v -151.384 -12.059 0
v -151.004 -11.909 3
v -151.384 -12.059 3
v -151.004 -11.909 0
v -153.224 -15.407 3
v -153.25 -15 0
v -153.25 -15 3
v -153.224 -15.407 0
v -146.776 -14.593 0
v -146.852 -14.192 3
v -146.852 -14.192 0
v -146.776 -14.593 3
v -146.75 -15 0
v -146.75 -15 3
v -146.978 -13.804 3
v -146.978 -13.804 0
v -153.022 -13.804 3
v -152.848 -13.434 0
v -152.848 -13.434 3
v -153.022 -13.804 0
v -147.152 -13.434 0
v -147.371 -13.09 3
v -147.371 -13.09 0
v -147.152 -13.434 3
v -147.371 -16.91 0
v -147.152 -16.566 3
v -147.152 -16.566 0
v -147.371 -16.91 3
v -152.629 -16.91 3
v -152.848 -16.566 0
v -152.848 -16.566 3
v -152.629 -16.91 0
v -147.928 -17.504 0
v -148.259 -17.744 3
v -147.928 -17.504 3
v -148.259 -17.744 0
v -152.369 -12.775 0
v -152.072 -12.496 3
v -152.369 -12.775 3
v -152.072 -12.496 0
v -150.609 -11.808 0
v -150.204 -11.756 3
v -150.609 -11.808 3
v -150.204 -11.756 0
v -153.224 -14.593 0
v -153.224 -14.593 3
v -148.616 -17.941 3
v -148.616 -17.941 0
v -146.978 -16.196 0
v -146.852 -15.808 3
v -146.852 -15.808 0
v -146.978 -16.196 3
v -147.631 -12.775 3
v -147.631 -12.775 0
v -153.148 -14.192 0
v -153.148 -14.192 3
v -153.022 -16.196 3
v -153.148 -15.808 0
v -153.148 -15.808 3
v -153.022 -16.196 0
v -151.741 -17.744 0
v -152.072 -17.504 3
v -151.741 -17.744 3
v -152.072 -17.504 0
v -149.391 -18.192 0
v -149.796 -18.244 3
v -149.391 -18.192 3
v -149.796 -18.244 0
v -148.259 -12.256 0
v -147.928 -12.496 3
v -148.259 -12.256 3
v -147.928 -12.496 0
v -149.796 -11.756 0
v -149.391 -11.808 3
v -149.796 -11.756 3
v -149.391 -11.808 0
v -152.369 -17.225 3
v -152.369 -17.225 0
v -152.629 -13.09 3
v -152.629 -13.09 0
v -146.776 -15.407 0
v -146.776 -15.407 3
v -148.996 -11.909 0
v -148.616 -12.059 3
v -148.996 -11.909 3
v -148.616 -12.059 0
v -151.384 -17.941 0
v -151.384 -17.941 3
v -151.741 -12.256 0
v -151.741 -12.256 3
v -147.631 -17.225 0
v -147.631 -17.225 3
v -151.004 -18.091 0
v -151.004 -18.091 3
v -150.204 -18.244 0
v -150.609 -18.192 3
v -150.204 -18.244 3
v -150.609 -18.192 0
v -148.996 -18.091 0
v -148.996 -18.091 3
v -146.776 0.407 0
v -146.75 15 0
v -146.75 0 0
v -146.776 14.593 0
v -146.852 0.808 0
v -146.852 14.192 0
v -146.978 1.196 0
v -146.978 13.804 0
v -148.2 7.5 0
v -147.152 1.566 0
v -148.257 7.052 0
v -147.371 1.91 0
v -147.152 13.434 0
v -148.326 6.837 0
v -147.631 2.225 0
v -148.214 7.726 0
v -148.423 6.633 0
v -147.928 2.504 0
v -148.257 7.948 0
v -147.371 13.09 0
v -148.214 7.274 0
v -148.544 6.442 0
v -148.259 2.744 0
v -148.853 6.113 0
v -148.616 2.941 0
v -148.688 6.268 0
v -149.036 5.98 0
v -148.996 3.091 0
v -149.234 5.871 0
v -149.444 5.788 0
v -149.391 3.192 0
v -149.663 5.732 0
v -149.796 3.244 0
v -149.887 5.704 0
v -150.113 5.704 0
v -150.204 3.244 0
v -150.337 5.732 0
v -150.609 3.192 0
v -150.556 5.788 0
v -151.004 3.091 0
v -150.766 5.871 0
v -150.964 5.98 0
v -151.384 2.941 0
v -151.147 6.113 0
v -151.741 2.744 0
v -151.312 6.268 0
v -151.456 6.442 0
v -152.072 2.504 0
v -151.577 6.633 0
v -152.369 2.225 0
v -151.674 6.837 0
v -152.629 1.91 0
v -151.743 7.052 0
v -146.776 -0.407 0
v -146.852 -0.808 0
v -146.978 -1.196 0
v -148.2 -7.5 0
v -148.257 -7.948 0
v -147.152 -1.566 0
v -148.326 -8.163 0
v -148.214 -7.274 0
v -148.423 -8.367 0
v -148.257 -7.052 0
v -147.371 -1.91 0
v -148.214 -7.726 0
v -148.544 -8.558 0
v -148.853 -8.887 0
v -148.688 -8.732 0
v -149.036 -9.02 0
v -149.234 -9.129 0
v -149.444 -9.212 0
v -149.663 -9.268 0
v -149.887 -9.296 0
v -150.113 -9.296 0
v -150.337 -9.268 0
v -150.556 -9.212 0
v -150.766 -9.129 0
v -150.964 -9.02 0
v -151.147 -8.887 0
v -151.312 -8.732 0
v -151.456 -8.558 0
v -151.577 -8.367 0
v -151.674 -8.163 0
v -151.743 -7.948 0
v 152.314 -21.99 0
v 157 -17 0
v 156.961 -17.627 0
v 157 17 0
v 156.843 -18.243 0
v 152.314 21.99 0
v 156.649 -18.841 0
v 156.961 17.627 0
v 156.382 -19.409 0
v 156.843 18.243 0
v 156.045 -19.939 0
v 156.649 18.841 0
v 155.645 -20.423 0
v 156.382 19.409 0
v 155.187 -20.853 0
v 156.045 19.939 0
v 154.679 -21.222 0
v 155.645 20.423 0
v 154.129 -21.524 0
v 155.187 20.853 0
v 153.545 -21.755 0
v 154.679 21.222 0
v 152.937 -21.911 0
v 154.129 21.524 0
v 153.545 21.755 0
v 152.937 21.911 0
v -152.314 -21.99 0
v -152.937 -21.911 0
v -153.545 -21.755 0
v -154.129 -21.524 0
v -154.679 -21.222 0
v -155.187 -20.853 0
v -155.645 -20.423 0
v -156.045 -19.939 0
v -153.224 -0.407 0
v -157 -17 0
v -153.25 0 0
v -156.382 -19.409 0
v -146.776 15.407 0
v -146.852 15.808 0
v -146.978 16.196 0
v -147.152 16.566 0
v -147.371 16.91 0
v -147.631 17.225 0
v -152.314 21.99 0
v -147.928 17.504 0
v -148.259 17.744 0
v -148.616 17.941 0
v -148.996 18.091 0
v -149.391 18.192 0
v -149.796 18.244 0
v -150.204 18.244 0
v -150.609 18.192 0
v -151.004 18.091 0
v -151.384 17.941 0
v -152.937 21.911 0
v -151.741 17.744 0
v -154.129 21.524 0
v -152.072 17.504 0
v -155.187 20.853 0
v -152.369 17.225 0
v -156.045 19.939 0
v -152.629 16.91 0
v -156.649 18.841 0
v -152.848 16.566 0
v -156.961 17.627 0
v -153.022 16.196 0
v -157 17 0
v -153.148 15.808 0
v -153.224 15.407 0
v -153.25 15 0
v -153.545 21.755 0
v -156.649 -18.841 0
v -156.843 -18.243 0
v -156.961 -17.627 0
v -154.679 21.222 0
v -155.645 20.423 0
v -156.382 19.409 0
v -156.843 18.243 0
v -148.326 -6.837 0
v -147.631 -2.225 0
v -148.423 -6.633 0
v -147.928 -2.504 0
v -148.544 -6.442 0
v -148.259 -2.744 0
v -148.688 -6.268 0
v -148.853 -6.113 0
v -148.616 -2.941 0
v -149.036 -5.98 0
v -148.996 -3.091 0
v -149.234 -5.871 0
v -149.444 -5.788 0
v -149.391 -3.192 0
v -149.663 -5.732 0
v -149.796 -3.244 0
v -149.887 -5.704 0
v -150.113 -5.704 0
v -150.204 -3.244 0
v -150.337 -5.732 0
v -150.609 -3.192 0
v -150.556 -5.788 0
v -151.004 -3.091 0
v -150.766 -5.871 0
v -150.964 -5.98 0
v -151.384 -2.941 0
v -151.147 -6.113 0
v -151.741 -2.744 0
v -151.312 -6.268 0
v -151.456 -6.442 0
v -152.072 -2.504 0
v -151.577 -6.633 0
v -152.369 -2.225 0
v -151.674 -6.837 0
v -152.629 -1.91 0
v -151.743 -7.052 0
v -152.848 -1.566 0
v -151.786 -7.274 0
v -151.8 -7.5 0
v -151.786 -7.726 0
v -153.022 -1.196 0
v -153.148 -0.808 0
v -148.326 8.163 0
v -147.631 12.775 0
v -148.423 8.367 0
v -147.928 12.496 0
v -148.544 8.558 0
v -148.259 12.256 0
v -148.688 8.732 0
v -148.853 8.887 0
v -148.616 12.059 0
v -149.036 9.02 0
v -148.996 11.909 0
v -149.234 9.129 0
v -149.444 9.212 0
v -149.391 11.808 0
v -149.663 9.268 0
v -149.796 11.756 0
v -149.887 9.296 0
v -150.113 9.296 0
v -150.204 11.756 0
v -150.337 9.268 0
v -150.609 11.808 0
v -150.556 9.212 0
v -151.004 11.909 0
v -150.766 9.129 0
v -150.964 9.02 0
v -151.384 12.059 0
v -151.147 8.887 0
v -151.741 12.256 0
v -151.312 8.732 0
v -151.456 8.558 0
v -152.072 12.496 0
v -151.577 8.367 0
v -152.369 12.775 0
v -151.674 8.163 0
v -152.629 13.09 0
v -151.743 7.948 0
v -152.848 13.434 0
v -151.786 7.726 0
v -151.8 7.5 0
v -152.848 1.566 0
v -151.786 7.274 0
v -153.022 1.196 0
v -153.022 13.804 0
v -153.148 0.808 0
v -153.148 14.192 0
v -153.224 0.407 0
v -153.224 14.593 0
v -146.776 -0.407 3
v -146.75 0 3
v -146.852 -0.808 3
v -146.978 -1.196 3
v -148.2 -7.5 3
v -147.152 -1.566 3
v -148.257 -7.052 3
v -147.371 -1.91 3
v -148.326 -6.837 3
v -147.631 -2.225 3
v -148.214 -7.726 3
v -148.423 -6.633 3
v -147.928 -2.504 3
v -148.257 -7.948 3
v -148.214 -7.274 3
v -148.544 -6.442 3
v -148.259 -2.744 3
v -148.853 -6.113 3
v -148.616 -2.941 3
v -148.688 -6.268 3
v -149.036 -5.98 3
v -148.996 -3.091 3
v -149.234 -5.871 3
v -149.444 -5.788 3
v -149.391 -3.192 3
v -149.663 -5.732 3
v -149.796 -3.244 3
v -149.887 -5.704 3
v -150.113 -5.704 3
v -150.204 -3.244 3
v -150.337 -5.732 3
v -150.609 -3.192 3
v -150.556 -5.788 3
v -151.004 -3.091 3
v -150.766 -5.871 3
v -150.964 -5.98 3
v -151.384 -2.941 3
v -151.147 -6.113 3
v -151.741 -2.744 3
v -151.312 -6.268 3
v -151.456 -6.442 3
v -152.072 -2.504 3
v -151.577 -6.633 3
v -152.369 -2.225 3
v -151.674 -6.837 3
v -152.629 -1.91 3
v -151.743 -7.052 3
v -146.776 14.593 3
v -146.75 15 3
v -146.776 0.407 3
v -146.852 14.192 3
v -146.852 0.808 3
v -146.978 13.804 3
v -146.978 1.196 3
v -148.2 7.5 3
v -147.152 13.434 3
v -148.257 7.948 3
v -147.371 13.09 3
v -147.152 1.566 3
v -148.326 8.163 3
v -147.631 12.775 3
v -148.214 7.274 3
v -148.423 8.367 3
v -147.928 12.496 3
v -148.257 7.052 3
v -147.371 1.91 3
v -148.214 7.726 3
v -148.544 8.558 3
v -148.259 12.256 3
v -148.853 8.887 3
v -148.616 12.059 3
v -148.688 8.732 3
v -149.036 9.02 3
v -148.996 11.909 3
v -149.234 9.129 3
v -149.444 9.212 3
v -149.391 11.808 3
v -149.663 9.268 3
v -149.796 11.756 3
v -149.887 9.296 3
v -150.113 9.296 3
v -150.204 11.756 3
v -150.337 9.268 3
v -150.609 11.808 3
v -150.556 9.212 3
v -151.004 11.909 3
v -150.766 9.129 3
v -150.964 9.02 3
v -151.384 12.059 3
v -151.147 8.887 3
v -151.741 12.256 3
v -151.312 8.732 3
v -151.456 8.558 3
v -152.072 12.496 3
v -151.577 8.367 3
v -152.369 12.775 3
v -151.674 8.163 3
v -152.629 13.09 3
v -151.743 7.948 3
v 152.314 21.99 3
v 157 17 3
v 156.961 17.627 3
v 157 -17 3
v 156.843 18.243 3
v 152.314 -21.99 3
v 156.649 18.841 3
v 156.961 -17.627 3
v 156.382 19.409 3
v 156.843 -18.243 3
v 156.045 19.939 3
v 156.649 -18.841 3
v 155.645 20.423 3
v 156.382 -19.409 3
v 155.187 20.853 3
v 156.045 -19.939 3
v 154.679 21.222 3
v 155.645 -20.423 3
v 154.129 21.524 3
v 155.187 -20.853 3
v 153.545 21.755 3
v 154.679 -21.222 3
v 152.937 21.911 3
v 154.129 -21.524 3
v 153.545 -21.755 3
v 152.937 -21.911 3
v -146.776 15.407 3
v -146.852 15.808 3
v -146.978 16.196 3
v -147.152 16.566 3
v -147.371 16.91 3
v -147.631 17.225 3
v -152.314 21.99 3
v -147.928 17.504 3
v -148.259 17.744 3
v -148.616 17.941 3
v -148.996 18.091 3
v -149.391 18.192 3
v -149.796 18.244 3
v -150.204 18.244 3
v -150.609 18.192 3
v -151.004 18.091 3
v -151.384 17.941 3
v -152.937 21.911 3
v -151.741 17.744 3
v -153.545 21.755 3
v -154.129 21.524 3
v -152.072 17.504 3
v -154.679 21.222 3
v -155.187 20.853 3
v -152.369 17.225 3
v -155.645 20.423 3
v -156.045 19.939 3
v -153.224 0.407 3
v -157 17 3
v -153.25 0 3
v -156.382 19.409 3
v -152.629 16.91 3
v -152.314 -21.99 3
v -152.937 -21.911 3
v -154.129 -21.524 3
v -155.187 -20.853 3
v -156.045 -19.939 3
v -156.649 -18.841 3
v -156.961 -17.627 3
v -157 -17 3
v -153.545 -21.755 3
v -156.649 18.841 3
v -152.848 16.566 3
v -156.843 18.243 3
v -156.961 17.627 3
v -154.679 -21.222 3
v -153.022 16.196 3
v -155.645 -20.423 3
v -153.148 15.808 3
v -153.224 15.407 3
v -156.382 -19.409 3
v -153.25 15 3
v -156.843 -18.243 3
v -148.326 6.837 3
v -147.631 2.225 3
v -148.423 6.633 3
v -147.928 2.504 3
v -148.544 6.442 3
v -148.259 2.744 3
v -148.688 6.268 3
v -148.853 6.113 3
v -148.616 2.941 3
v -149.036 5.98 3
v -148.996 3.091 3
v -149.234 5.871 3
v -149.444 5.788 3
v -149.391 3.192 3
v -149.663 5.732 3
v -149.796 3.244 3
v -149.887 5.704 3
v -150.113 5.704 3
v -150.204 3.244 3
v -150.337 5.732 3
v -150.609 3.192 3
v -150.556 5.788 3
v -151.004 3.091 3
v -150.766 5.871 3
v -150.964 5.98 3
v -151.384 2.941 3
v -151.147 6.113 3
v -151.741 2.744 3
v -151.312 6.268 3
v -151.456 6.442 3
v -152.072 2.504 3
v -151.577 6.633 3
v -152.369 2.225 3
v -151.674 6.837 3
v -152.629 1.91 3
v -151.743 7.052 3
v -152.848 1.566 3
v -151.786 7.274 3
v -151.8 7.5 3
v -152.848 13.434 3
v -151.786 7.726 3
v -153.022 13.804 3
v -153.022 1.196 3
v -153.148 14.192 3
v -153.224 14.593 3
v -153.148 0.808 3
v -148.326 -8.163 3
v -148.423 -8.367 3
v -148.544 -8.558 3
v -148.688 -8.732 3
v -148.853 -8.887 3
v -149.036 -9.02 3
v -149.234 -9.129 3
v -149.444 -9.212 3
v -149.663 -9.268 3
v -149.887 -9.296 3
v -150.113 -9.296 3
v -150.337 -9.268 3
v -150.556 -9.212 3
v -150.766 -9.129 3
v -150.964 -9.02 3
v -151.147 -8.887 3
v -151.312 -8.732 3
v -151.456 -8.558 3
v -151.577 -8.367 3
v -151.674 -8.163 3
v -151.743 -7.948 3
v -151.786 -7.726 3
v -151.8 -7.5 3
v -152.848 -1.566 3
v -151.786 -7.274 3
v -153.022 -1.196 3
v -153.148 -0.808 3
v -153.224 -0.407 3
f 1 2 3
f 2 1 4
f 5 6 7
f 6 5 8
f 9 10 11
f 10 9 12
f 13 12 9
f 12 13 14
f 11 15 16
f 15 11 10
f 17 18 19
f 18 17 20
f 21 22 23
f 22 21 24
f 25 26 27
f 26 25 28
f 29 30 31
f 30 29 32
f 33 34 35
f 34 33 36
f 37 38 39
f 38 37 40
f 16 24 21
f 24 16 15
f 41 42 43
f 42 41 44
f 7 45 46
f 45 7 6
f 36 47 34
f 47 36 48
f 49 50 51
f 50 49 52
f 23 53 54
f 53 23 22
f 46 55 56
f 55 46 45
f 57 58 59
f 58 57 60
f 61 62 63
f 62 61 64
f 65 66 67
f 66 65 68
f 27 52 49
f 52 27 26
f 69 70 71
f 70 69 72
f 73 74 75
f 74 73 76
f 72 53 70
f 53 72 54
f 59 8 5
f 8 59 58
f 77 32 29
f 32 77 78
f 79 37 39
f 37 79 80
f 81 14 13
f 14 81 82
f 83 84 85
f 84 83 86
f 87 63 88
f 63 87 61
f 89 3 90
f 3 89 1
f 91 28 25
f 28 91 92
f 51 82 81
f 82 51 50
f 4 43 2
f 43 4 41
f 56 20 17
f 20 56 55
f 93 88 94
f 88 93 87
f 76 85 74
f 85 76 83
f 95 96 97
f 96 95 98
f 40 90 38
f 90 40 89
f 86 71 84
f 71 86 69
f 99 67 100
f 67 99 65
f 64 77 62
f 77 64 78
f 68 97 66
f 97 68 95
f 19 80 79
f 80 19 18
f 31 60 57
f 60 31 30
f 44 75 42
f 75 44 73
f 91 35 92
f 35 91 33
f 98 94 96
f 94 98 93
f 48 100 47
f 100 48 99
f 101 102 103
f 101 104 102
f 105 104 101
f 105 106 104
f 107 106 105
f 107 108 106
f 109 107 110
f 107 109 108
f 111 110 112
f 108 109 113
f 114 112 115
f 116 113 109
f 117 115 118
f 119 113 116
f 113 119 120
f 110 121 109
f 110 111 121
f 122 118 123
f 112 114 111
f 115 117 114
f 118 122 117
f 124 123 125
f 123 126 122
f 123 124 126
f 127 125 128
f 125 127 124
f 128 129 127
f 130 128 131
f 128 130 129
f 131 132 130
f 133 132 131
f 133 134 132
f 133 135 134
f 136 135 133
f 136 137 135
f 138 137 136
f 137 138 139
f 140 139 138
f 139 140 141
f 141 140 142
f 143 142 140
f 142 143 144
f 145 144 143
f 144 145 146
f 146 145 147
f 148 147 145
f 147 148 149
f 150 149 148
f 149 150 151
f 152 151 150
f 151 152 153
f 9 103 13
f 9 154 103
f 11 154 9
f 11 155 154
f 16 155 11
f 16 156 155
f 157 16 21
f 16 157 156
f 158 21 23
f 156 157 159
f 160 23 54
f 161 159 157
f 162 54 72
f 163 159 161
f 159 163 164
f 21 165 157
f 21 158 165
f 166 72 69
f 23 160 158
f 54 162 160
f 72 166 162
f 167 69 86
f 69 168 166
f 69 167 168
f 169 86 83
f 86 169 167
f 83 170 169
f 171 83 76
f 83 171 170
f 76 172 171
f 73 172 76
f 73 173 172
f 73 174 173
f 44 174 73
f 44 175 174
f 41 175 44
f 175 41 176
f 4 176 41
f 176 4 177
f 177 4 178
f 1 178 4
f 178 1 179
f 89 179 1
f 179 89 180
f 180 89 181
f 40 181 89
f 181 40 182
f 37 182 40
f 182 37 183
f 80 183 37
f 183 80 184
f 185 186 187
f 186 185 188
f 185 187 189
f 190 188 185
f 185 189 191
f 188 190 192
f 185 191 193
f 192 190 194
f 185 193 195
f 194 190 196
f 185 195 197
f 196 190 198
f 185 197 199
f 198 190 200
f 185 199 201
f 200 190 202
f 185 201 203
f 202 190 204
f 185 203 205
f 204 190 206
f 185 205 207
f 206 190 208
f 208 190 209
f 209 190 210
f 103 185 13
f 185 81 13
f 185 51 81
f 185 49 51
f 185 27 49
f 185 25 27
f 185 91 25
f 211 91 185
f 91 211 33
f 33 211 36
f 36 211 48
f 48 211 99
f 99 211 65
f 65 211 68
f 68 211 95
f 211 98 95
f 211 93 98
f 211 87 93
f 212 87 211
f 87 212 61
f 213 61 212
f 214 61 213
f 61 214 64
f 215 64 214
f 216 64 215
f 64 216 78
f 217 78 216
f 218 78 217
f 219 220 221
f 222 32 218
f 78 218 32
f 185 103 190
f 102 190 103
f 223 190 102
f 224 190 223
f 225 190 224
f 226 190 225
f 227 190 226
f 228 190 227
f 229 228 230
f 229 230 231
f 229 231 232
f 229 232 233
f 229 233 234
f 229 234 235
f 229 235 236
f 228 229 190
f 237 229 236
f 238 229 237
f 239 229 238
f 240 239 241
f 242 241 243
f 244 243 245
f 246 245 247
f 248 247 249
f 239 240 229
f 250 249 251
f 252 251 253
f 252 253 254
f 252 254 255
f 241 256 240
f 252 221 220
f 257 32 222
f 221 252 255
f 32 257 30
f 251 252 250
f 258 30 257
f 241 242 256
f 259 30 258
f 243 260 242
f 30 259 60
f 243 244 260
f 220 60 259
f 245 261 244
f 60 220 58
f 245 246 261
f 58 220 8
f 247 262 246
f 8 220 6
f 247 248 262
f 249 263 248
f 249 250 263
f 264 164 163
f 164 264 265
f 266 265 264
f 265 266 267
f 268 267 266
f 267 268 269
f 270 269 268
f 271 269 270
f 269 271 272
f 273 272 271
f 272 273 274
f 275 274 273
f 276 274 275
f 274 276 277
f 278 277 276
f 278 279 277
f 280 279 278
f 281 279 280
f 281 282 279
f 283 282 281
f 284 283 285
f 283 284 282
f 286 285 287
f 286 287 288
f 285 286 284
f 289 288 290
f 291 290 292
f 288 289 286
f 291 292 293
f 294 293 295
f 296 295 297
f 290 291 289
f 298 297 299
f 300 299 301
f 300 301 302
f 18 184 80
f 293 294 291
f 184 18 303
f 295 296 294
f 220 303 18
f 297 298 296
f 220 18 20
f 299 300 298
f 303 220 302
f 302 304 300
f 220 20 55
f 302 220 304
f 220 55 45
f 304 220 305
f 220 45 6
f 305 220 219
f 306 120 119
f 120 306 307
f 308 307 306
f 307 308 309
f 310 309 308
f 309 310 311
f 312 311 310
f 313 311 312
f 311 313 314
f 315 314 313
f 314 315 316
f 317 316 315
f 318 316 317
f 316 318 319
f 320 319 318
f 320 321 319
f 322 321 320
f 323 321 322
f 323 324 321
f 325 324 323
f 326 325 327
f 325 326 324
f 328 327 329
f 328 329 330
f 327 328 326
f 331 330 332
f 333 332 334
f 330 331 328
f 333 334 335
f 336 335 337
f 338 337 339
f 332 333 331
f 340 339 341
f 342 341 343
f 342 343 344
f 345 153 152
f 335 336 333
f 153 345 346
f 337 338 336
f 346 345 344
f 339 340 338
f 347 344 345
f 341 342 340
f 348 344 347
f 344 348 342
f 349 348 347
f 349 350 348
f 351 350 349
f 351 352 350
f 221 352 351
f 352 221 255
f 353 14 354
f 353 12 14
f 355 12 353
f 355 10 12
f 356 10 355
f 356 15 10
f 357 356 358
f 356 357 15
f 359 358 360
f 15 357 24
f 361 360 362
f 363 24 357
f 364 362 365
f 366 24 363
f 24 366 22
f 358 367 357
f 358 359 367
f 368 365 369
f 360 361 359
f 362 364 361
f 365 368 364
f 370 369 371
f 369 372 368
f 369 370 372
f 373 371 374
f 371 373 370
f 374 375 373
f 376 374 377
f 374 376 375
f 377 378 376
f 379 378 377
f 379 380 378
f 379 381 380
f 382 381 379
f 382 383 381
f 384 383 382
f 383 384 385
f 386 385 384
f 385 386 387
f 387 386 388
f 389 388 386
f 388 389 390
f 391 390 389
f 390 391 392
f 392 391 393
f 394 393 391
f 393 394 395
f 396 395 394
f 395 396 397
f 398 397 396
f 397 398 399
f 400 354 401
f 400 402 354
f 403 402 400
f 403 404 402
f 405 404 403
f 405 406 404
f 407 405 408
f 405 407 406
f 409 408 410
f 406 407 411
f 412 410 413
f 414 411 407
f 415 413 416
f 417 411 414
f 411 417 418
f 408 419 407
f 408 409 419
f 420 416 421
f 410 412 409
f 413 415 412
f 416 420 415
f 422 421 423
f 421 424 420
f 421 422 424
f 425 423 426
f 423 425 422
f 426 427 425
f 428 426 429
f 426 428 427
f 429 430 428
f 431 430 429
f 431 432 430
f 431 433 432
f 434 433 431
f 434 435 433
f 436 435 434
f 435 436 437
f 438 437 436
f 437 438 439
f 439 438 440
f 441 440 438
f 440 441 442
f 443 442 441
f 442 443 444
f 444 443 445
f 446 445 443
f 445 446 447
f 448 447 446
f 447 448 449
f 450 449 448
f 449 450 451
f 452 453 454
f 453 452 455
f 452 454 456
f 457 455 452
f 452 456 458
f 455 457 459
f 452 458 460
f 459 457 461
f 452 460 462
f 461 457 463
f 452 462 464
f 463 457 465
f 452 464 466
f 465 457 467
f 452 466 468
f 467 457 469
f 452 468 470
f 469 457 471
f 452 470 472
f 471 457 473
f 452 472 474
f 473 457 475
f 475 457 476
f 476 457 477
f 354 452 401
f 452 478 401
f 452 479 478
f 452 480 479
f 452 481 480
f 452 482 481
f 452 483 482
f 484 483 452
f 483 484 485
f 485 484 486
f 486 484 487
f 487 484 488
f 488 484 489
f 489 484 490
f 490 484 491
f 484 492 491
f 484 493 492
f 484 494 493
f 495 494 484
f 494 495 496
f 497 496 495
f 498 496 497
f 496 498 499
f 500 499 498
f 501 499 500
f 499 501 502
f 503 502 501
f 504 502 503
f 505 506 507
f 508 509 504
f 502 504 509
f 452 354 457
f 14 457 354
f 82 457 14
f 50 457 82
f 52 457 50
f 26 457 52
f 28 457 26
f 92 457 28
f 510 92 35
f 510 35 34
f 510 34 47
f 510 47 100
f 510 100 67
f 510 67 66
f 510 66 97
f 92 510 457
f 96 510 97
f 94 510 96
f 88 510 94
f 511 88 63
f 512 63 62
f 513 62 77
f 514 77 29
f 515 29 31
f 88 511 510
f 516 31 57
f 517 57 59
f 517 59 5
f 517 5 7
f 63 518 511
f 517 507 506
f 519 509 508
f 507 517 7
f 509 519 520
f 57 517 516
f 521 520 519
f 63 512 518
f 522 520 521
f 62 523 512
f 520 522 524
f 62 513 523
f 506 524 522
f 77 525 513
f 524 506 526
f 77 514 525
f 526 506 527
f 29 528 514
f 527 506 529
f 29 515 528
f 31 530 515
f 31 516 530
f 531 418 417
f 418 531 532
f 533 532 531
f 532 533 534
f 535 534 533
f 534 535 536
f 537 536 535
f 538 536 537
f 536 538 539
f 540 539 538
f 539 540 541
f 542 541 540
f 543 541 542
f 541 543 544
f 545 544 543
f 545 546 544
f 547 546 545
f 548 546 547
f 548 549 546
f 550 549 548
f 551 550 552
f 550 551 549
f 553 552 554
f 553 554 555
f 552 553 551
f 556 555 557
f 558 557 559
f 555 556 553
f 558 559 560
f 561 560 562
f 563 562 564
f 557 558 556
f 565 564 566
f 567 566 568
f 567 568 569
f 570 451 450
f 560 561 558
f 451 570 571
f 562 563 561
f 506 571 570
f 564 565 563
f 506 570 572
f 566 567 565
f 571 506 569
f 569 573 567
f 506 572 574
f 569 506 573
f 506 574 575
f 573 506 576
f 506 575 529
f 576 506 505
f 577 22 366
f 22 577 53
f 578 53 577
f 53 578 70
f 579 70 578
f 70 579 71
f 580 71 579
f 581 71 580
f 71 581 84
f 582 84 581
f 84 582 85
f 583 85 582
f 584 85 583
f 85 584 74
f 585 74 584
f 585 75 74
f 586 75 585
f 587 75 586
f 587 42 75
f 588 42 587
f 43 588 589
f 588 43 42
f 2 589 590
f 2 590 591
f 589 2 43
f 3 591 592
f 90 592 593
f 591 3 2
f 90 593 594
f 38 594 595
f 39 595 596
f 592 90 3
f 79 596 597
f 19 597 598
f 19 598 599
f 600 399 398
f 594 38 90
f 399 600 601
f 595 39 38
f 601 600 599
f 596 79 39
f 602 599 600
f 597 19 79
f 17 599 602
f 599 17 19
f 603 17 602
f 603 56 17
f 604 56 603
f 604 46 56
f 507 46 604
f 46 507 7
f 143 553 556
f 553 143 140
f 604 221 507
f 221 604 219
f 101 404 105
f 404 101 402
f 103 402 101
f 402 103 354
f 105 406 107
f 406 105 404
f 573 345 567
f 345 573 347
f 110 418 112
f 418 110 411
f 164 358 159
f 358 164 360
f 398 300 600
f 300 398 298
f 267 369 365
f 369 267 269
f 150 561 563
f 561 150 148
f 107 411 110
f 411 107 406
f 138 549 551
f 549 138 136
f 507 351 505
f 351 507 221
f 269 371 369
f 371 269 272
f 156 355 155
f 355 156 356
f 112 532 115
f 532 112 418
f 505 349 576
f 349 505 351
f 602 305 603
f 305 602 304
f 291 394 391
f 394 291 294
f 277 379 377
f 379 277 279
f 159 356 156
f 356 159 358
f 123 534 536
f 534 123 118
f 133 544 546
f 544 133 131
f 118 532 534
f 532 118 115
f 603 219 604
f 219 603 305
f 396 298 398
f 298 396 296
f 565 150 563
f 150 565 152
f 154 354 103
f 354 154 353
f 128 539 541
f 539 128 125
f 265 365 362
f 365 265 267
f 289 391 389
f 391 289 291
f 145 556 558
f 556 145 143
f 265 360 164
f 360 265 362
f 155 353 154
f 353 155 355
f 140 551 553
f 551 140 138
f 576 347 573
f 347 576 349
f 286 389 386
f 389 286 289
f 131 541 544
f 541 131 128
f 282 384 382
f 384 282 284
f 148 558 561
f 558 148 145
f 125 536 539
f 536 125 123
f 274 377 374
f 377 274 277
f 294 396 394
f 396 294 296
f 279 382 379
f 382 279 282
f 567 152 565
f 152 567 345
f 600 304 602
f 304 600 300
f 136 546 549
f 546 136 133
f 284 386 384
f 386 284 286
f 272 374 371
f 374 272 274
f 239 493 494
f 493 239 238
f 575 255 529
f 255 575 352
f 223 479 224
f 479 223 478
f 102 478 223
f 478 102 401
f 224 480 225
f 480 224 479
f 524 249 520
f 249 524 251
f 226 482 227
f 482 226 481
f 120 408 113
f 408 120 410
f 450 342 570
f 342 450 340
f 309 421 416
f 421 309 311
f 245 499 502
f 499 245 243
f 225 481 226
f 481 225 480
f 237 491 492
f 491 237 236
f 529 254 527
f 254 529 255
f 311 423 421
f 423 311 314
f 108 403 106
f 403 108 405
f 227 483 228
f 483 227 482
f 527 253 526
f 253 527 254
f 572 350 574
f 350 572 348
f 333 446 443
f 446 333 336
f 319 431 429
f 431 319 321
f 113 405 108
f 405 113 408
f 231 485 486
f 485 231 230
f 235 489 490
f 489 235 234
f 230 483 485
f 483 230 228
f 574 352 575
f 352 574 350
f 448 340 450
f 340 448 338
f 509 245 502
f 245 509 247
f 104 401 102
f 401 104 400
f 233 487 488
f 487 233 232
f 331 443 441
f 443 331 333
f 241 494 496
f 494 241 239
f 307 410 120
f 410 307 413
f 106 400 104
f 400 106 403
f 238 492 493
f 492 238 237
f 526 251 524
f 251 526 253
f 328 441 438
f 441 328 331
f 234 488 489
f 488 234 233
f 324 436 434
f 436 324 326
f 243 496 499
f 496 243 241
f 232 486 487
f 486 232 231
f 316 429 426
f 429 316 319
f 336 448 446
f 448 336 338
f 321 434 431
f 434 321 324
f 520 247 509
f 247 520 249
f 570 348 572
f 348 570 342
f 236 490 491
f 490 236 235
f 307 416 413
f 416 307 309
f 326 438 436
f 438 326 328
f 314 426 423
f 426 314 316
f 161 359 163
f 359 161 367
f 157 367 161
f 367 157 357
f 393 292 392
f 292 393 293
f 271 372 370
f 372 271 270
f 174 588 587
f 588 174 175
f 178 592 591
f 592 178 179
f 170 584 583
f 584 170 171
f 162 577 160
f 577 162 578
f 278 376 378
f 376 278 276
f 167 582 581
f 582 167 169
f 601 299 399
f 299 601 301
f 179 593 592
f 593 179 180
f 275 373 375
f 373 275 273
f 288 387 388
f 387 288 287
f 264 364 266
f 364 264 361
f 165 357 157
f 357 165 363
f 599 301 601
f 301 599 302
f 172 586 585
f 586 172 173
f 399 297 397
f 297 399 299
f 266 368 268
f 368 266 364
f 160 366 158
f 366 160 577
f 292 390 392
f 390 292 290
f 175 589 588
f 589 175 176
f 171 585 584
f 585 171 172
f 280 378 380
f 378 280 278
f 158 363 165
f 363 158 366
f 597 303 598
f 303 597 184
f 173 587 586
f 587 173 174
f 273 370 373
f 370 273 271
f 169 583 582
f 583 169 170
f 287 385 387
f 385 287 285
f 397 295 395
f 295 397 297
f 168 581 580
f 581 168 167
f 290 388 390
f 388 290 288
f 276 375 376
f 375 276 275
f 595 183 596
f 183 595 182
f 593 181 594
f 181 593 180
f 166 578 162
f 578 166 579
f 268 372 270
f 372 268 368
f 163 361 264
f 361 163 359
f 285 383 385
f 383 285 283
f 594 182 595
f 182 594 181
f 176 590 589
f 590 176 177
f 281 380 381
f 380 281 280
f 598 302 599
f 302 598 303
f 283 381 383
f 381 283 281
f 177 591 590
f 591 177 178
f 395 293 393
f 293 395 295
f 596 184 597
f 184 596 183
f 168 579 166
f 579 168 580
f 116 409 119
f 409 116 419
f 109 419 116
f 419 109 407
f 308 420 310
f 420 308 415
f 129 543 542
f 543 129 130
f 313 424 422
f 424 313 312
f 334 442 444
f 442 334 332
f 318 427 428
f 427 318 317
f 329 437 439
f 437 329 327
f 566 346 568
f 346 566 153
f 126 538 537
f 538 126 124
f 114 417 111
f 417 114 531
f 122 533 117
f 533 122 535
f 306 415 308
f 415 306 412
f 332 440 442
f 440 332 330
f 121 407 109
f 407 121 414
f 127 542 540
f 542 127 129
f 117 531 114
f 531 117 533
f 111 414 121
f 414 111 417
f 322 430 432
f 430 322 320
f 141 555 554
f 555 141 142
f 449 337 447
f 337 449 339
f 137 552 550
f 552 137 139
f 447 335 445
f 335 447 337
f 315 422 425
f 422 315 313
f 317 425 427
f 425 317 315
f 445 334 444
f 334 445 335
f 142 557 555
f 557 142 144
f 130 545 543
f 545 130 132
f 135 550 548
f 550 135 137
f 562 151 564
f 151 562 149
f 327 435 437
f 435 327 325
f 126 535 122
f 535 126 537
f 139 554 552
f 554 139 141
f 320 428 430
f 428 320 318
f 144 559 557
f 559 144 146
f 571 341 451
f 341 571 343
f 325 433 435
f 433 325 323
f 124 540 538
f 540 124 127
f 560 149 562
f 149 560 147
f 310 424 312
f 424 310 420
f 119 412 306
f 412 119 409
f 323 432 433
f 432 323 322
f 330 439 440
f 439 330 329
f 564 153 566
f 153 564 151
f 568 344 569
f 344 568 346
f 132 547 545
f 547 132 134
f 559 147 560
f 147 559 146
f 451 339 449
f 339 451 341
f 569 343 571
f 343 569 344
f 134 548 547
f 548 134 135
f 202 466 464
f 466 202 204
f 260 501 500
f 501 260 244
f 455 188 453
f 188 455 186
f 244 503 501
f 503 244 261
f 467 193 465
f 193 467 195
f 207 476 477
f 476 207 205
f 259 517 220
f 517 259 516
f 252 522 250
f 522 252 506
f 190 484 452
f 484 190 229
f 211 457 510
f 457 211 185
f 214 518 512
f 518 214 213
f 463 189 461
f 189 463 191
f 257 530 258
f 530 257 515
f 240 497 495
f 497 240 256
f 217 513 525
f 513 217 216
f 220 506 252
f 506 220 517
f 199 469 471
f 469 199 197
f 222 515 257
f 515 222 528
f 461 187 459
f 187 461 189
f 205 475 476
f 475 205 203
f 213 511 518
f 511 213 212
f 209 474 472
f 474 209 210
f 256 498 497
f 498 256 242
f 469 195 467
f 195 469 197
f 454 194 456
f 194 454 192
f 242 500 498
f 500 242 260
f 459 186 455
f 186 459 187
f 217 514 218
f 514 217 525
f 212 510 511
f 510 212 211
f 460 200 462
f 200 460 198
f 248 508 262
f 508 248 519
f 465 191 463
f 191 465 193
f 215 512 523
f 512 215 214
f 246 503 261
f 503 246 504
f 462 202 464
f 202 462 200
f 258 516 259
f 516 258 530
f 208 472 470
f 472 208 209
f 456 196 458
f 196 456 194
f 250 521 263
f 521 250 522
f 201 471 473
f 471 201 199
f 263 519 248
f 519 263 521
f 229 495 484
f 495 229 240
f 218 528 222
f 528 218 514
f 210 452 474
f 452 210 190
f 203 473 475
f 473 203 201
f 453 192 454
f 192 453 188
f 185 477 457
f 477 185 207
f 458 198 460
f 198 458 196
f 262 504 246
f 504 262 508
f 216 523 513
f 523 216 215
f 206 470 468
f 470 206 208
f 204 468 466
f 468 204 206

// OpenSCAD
$fn = 50;


difference() {
	union() {
		hull() {
			translate(v = [-152.0000000000, 17.0000000000, 0]) {
				cylinder(h = 3, r = 5);
			}
			translate(v = [152.0000000000, 17.0000000000, 0]) {
				cylinder(h = 3, r = 5);
			}
			translate(v = [-152.0000000000, -17.0000000000, 0]) {
				cylinder(h = 3, r = 5);
			}
			translate(v = [152.0000000000, -17.0000000000, 0]) {
				cylinder(h = 3, r = 5);
			}
		}
	}
	union() {
		translate(v = [-150.0000000000, -15.0000000000, 0]) {
			cylinder(h = 3, r = 3.2500000000);
		}
		translate(v = [-150.0000000000, 0.0000000000, 0]) {
			cylinder(h = 3, r = 3.2500000000);
		}
		translate(v = [-150.0000000000, 15.0000000000, 0]) {
			cylinder(h = 3, r = 3.2500000000);
		}
		translate(v = [-150.0000000000, -15.0000000000, 0]) {
			cylinder(h = 3, r = 1.8000000000);
		}
		translate(v = [-150.0000000000, -7.5000000000, 0]) {
			cylinder(h = 3, r = 1.8000000000);
		}
		translate(v = [-150.0000000000, 0.0000000000, 0]) {
			cylinder(h = 3, r = 1.8000000000);
		}
		translate(v = [-150.0000000000, 7.5000000000, 0]) {
			cylinder(h = 3, r = 1.8000000000);
		}
		translate(v = [-150.0000000000, 15.0000000000, 0]) {
			cylinder(h = 3, r = 1.8000000000);
		}
		translate(v = [-150.0000000000, -15.0000000000, 0]) {
			cylinder(h = 3, r = 1.8000000000);
		}
		translate(v = [-150.0000000000, -7.5000000000, 0]) {
			cylinder(h = 3, r = 1.8000000000);
		}
		translate(v = [-150.0000000000, 0.0000000000, 0]) {
			cylinder(h = 3, r = 1.8000000000);
		}
		translate(v = [-150.0000000000, 7.5000000000, 0]) {
			cylinder(h = 3, r = 1.8000000000);
		}
		translate(v = [-150.0000000000, 15.0000000000, 0]) {
			cylinder(h = 3, r = 1.8000000000);
		}
		translate(v = [-150.0000000000, -15.0000000000, 0]) {
			cylinder(h = 3, r = 1.8000000000);
		}
		translate(v = [-150.0000000000, -7.5000000000, 0]) {
			cylinder(h = 3, r = 1.8000000000);
		}
		translate(v = [-150.0000000000, 0.0000000000, 0]) {
			cylinder(h = 3, r = 1.8000000000);
		}
		translate(v = [-150.0000000000, 7.5000000000, 0]) {
			cylinder(h = 3, r = 1.8000000000);
		}
		translate(v = [-150.0000000000, 15.0000000000, 0]) {
			cylinder(h = 3, r = 1.8000000000);
		}
	}
}
